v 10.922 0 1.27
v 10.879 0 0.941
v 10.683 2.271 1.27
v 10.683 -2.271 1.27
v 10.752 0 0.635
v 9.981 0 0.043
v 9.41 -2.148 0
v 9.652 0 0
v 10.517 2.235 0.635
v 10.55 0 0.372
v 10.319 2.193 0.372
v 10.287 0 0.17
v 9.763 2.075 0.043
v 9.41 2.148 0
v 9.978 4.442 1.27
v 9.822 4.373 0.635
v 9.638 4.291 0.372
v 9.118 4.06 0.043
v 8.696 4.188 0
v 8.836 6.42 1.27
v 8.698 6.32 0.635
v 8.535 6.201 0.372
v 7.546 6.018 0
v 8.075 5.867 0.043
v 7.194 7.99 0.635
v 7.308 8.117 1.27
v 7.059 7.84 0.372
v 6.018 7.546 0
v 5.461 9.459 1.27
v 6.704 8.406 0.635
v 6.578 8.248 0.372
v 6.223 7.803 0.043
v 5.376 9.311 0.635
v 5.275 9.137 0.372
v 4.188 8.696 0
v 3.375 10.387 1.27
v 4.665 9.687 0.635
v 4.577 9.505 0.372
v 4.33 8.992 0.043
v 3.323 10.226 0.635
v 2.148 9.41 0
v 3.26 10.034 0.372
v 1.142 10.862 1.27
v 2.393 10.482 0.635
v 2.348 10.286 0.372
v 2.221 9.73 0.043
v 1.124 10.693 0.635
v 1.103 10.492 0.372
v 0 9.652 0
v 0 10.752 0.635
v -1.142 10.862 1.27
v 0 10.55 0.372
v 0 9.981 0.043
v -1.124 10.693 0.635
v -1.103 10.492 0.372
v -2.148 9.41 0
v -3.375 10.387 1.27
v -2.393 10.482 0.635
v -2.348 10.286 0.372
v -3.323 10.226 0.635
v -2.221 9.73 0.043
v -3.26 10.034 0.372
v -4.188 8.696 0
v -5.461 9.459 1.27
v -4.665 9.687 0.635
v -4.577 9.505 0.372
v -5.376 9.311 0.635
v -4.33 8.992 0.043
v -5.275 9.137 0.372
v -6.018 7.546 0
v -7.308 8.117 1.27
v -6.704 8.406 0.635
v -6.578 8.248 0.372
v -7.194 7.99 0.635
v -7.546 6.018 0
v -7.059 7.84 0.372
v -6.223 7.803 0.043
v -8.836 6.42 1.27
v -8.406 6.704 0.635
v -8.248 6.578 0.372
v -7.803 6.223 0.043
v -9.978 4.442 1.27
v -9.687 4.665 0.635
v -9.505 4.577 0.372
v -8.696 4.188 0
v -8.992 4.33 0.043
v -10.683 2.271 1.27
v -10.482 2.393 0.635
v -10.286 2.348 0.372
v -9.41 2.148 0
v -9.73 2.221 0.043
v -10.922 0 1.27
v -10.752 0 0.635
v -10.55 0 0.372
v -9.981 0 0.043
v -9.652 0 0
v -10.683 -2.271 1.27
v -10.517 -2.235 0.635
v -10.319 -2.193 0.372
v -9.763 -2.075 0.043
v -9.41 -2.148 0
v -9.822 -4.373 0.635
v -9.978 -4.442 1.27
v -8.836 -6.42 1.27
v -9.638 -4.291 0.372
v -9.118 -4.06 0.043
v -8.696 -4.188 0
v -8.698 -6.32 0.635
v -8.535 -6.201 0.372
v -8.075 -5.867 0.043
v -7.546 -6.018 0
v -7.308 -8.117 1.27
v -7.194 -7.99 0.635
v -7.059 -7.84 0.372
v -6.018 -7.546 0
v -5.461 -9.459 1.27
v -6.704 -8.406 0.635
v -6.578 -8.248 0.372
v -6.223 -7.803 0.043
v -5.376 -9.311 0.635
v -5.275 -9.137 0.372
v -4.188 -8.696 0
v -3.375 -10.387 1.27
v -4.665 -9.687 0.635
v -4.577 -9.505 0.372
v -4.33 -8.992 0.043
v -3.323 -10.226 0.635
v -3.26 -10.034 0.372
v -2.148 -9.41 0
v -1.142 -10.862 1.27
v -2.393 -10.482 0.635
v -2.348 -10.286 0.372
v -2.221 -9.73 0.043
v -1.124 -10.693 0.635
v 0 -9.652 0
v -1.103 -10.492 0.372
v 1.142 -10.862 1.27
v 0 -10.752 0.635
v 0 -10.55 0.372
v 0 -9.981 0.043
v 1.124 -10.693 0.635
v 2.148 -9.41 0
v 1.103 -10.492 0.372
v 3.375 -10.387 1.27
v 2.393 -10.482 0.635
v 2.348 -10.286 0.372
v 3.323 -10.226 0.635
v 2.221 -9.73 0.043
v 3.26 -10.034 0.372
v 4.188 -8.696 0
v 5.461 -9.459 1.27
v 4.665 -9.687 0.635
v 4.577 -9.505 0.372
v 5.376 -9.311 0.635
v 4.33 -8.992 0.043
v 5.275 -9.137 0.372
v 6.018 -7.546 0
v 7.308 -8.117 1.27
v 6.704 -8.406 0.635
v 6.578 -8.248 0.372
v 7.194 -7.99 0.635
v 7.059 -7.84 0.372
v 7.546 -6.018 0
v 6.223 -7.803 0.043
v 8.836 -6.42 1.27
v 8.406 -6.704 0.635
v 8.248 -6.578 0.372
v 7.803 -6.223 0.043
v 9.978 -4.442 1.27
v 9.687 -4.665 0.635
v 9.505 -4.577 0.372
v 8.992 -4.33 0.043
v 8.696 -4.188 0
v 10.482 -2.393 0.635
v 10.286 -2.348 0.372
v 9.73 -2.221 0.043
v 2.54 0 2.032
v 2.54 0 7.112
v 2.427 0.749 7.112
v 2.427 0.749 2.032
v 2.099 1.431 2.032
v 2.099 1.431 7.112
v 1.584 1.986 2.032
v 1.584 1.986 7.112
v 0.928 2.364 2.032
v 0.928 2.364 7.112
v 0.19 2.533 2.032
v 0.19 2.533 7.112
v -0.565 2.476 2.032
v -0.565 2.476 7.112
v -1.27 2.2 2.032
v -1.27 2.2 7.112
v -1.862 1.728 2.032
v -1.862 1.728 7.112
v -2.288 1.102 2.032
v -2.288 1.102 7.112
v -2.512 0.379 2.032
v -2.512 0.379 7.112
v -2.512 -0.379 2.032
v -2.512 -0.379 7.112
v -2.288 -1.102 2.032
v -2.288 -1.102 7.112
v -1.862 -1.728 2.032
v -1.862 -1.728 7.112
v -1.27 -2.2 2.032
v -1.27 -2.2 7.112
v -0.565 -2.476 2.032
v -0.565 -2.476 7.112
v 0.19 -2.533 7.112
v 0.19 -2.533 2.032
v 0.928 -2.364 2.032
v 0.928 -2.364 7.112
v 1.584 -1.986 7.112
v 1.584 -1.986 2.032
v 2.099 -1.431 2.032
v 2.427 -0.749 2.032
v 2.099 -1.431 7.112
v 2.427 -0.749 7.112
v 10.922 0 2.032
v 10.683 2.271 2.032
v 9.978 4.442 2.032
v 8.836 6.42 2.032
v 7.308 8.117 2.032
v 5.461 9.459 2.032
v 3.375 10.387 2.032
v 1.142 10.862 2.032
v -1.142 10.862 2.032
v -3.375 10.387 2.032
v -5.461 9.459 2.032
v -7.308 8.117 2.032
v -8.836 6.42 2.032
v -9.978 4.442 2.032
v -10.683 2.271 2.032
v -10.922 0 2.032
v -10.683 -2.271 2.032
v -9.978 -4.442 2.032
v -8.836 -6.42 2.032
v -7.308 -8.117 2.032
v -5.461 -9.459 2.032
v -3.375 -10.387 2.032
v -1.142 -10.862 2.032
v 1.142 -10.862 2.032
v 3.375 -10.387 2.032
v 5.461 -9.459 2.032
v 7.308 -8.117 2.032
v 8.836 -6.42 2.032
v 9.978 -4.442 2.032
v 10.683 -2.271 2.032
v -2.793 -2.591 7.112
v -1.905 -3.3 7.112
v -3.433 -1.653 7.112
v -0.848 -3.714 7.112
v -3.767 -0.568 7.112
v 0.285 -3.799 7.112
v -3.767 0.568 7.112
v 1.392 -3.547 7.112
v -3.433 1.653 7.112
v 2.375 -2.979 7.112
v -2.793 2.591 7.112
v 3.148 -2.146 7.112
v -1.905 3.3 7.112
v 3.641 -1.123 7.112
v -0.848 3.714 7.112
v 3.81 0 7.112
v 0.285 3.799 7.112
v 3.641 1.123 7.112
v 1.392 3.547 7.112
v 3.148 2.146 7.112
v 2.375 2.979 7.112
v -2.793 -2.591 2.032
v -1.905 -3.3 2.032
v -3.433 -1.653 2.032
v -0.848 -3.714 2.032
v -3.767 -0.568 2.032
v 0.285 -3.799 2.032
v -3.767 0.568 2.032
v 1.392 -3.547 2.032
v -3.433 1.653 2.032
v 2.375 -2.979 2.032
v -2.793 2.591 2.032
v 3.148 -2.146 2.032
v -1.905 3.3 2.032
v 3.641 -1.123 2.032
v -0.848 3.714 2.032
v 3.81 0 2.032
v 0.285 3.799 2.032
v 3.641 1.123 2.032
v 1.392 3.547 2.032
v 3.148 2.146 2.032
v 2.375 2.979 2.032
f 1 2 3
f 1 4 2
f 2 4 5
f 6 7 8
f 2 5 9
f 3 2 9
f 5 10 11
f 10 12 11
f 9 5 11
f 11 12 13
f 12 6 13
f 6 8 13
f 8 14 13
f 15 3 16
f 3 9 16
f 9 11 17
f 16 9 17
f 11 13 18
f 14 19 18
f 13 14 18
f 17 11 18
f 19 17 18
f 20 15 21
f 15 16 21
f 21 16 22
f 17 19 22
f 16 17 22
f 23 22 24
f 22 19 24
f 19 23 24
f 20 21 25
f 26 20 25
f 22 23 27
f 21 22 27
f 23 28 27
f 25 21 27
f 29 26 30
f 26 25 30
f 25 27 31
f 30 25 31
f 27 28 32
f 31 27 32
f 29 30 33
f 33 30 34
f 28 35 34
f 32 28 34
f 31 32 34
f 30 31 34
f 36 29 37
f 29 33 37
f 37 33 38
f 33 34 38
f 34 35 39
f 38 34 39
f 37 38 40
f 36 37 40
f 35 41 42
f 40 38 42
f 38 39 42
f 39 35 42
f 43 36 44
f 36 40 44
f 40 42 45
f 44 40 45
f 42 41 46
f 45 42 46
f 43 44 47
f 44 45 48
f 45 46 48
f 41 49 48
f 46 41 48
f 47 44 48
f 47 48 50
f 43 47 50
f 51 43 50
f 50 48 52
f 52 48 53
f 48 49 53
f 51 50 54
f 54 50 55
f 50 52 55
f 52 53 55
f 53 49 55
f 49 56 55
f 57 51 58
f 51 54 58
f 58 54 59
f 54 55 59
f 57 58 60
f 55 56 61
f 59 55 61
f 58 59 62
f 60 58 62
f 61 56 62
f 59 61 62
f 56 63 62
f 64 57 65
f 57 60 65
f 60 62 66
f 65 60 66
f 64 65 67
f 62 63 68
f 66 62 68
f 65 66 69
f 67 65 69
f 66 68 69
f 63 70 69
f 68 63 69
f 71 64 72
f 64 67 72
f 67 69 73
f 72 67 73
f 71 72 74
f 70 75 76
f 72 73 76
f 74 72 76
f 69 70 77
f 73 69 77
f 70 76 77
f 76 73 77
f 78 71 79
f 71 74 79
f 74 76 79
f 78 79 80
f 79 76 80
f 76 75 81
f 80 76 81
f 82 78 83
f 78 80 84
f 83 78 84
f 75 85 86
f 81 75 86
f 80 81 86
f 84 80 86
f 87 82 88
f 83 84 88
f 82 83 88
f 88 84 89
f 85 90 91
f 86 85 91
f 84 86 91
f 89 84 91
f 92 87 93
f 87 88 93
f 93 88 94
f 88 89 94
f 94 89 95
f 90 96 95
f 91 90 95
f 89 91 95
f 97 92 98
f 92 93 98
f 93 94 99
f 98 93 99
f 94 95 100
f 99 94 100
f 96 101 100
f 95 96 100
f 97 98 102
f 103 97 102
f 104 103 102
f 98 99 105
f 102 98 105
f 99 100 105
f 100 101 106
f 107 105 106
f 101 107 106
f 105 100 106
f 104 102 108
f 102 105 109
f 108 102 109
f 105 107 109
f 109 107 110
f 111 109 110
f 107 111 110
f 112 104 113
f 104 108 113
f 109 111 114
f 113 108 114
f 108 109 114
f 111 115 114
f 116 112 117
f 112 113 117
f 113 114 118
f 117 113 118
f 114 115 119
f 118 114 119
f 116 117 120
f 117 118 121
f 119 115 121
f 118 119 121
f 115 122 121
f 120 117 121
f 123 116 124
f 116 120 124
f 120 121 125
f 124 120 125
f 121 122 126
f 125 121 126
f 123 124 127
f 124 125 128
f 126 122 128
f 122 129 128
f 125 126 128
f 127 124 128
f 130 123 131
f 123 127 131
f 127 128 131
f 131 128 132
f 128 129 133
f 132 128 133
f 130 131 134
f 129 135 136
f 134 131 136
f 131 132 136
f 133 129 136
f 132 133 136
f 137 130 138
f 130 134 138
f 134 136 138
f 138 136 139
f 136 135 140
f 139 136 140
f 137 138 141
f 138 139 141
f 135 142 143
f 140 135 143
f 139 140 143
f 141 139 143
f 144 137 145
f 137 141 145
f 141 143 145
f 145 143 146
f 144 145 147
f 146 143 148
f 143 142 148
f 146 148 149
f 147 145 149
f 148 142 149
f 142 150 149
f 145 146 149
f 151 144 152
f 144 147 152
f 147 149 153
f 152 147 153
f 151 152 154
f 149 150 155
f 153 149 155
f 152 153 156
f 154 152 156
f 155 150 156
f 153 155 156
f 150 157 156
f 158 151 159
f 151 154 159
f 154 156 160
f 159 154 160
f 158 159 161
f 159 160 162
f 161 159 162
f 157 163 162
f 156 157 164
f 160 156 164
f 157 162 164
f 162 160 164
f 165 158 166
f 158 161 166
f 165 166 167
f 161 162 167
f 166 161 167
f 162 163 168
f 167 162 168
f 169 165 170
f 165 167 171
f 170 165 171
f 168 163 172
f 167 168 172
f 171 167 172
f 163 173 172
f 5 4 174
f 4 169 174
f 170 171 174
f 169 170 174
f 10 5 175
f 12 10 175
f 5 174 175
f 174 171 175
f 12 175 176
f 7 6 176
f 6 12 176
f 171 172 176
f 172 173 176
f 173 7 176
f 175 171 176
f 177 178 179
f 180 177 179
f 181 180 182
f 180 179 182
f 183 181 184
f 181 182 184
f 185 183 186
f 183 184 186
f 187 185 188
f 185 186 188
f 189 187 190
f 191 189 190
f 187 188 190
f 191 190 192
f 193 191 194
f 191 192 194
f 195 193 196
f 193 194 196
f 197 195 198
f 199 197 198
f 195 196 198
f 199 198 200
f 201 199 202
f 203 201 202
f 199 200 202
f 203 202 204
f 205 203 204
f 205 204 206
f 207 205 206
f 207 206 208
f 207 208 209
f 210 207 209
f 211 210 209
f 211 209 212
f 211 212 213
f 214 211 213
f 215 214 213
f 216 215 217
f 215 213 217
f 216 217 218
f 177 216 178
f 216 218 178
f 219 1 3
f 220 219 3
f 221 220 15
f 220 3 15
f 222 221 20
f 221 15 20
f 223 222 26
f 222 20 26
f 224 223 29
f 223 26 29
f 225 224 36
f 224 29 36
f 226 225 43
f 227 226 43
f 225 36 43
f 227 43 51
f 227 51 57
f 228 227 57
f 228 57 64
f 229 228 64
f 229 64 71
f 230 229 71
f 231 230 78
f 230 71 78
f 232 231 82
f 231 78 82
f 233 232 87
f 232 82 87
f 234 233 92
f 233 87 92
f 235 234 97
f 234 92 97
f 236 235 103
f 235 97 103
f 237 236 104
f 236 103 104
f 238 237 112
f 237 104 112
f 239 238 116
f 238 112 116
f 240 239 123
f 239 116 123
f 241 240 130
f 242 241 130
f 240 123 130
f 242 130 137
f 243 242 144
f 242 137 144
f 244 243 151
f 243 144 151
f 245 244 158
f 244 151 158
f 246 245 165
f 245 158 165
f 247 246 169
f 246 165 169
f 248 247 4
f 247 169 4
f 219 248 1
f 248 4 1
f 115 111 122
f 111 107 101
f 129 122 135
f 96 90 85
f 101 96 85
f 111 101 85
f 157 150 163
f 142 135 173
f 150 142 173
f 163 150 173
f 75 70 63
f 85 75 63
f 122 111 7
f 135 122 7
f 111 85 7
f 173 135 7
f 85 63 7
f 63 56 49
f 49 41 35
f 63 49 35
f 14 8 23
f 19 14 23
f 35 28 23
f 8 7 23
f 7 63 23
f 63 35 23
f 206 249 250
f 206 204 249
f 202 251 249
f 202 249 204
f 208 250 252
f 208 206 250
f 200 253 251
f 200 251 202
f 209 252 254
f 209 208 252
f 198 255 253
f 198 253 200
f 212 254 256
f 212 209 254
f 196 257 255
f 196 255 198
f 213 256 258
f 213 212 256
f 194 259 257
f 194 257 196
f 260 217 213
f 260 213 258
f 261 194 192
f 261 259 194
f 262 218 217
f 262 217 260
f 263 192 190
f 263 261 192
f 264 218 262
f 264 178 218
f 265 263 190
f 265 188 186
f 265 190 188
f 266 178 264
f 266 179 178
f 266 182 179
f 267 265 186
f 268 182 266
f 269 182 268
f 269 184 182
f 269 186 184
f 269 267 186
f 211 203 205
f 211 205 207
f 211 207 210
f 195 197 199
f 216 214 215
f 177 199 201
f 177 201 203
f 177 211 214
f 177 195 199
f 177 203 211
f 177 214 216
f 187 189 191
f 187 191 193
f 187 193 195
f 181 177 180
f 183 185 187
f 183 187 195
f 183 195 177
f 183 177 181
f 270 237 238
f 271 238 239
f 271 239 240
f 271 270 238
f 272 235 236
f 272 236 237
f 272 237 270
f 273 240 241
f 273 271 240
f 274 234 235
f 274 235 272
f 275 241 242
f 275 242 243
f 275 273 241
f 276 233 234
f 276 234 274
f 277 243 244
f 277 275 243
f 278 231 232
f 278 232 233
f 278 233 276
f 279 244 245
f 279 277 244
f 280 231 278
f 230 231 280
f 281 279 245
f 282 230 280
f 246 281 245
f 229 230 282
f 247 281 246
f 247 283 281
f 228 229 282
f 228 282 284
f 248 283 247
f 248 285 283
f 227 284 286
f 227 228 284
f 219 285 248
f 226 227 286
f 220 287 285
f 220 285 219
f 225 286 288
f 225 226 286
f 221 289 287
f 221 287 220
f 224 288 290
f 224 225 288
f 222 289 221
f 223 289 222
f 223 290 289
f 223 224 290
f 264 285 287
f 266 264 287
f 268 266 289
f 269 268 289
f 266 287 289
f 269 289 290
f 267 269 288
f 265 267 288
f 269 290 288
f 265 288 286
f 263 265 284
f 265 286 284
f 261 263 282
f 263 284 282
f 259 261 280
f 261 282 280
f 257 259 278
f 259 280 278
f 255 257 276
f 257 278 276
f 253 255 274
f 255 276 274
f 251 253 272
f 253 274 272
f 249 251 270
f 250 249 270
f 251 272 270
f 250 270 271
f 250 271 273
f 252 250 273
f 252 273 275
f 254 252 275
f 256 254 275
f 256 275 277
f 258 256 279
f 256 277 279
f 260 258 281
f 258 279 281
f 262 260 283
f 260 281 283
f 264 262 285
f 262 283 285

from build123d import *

# Parameters (mm, degrees)
F0_R     = 10.922
F1_DEPTH = 2.032
F2_R     = 3.81
F3_DEPTH = 5.08
F4_R     = 2.54
F5_DEPTH = 5.08
F6_R     = 1.27


with BuildPart() as f1:
    # F0 (on Top) → F1 (new body)
    with BuildSketch(Plane.XY):
        Circle(F0_R)
    extrude(amount=F1_DEPTH)

    # F2 (on face) → F3 (join)
    with BuildSketch(Plane.XY.offset(2.032)):
        Circle(F2_R)
    extrude(amount=F3_DEPTH)

    # F4 (on face) → F5 (cut, through all)
    with BuildSketch(Plane.XY.offset(7.112)):
        Circle(F4_R)
    extrude(amount=-F5_DEPTH, mode=Mode.SUBTRACT)

    # F6
    f6_edges = [f1.edges().sort_by_distance(p)[0] for p in [
        (-10.922, 0, 0),
    ]]
    fillet(f6_edges, radius=F6_R)


solid = f1.part
